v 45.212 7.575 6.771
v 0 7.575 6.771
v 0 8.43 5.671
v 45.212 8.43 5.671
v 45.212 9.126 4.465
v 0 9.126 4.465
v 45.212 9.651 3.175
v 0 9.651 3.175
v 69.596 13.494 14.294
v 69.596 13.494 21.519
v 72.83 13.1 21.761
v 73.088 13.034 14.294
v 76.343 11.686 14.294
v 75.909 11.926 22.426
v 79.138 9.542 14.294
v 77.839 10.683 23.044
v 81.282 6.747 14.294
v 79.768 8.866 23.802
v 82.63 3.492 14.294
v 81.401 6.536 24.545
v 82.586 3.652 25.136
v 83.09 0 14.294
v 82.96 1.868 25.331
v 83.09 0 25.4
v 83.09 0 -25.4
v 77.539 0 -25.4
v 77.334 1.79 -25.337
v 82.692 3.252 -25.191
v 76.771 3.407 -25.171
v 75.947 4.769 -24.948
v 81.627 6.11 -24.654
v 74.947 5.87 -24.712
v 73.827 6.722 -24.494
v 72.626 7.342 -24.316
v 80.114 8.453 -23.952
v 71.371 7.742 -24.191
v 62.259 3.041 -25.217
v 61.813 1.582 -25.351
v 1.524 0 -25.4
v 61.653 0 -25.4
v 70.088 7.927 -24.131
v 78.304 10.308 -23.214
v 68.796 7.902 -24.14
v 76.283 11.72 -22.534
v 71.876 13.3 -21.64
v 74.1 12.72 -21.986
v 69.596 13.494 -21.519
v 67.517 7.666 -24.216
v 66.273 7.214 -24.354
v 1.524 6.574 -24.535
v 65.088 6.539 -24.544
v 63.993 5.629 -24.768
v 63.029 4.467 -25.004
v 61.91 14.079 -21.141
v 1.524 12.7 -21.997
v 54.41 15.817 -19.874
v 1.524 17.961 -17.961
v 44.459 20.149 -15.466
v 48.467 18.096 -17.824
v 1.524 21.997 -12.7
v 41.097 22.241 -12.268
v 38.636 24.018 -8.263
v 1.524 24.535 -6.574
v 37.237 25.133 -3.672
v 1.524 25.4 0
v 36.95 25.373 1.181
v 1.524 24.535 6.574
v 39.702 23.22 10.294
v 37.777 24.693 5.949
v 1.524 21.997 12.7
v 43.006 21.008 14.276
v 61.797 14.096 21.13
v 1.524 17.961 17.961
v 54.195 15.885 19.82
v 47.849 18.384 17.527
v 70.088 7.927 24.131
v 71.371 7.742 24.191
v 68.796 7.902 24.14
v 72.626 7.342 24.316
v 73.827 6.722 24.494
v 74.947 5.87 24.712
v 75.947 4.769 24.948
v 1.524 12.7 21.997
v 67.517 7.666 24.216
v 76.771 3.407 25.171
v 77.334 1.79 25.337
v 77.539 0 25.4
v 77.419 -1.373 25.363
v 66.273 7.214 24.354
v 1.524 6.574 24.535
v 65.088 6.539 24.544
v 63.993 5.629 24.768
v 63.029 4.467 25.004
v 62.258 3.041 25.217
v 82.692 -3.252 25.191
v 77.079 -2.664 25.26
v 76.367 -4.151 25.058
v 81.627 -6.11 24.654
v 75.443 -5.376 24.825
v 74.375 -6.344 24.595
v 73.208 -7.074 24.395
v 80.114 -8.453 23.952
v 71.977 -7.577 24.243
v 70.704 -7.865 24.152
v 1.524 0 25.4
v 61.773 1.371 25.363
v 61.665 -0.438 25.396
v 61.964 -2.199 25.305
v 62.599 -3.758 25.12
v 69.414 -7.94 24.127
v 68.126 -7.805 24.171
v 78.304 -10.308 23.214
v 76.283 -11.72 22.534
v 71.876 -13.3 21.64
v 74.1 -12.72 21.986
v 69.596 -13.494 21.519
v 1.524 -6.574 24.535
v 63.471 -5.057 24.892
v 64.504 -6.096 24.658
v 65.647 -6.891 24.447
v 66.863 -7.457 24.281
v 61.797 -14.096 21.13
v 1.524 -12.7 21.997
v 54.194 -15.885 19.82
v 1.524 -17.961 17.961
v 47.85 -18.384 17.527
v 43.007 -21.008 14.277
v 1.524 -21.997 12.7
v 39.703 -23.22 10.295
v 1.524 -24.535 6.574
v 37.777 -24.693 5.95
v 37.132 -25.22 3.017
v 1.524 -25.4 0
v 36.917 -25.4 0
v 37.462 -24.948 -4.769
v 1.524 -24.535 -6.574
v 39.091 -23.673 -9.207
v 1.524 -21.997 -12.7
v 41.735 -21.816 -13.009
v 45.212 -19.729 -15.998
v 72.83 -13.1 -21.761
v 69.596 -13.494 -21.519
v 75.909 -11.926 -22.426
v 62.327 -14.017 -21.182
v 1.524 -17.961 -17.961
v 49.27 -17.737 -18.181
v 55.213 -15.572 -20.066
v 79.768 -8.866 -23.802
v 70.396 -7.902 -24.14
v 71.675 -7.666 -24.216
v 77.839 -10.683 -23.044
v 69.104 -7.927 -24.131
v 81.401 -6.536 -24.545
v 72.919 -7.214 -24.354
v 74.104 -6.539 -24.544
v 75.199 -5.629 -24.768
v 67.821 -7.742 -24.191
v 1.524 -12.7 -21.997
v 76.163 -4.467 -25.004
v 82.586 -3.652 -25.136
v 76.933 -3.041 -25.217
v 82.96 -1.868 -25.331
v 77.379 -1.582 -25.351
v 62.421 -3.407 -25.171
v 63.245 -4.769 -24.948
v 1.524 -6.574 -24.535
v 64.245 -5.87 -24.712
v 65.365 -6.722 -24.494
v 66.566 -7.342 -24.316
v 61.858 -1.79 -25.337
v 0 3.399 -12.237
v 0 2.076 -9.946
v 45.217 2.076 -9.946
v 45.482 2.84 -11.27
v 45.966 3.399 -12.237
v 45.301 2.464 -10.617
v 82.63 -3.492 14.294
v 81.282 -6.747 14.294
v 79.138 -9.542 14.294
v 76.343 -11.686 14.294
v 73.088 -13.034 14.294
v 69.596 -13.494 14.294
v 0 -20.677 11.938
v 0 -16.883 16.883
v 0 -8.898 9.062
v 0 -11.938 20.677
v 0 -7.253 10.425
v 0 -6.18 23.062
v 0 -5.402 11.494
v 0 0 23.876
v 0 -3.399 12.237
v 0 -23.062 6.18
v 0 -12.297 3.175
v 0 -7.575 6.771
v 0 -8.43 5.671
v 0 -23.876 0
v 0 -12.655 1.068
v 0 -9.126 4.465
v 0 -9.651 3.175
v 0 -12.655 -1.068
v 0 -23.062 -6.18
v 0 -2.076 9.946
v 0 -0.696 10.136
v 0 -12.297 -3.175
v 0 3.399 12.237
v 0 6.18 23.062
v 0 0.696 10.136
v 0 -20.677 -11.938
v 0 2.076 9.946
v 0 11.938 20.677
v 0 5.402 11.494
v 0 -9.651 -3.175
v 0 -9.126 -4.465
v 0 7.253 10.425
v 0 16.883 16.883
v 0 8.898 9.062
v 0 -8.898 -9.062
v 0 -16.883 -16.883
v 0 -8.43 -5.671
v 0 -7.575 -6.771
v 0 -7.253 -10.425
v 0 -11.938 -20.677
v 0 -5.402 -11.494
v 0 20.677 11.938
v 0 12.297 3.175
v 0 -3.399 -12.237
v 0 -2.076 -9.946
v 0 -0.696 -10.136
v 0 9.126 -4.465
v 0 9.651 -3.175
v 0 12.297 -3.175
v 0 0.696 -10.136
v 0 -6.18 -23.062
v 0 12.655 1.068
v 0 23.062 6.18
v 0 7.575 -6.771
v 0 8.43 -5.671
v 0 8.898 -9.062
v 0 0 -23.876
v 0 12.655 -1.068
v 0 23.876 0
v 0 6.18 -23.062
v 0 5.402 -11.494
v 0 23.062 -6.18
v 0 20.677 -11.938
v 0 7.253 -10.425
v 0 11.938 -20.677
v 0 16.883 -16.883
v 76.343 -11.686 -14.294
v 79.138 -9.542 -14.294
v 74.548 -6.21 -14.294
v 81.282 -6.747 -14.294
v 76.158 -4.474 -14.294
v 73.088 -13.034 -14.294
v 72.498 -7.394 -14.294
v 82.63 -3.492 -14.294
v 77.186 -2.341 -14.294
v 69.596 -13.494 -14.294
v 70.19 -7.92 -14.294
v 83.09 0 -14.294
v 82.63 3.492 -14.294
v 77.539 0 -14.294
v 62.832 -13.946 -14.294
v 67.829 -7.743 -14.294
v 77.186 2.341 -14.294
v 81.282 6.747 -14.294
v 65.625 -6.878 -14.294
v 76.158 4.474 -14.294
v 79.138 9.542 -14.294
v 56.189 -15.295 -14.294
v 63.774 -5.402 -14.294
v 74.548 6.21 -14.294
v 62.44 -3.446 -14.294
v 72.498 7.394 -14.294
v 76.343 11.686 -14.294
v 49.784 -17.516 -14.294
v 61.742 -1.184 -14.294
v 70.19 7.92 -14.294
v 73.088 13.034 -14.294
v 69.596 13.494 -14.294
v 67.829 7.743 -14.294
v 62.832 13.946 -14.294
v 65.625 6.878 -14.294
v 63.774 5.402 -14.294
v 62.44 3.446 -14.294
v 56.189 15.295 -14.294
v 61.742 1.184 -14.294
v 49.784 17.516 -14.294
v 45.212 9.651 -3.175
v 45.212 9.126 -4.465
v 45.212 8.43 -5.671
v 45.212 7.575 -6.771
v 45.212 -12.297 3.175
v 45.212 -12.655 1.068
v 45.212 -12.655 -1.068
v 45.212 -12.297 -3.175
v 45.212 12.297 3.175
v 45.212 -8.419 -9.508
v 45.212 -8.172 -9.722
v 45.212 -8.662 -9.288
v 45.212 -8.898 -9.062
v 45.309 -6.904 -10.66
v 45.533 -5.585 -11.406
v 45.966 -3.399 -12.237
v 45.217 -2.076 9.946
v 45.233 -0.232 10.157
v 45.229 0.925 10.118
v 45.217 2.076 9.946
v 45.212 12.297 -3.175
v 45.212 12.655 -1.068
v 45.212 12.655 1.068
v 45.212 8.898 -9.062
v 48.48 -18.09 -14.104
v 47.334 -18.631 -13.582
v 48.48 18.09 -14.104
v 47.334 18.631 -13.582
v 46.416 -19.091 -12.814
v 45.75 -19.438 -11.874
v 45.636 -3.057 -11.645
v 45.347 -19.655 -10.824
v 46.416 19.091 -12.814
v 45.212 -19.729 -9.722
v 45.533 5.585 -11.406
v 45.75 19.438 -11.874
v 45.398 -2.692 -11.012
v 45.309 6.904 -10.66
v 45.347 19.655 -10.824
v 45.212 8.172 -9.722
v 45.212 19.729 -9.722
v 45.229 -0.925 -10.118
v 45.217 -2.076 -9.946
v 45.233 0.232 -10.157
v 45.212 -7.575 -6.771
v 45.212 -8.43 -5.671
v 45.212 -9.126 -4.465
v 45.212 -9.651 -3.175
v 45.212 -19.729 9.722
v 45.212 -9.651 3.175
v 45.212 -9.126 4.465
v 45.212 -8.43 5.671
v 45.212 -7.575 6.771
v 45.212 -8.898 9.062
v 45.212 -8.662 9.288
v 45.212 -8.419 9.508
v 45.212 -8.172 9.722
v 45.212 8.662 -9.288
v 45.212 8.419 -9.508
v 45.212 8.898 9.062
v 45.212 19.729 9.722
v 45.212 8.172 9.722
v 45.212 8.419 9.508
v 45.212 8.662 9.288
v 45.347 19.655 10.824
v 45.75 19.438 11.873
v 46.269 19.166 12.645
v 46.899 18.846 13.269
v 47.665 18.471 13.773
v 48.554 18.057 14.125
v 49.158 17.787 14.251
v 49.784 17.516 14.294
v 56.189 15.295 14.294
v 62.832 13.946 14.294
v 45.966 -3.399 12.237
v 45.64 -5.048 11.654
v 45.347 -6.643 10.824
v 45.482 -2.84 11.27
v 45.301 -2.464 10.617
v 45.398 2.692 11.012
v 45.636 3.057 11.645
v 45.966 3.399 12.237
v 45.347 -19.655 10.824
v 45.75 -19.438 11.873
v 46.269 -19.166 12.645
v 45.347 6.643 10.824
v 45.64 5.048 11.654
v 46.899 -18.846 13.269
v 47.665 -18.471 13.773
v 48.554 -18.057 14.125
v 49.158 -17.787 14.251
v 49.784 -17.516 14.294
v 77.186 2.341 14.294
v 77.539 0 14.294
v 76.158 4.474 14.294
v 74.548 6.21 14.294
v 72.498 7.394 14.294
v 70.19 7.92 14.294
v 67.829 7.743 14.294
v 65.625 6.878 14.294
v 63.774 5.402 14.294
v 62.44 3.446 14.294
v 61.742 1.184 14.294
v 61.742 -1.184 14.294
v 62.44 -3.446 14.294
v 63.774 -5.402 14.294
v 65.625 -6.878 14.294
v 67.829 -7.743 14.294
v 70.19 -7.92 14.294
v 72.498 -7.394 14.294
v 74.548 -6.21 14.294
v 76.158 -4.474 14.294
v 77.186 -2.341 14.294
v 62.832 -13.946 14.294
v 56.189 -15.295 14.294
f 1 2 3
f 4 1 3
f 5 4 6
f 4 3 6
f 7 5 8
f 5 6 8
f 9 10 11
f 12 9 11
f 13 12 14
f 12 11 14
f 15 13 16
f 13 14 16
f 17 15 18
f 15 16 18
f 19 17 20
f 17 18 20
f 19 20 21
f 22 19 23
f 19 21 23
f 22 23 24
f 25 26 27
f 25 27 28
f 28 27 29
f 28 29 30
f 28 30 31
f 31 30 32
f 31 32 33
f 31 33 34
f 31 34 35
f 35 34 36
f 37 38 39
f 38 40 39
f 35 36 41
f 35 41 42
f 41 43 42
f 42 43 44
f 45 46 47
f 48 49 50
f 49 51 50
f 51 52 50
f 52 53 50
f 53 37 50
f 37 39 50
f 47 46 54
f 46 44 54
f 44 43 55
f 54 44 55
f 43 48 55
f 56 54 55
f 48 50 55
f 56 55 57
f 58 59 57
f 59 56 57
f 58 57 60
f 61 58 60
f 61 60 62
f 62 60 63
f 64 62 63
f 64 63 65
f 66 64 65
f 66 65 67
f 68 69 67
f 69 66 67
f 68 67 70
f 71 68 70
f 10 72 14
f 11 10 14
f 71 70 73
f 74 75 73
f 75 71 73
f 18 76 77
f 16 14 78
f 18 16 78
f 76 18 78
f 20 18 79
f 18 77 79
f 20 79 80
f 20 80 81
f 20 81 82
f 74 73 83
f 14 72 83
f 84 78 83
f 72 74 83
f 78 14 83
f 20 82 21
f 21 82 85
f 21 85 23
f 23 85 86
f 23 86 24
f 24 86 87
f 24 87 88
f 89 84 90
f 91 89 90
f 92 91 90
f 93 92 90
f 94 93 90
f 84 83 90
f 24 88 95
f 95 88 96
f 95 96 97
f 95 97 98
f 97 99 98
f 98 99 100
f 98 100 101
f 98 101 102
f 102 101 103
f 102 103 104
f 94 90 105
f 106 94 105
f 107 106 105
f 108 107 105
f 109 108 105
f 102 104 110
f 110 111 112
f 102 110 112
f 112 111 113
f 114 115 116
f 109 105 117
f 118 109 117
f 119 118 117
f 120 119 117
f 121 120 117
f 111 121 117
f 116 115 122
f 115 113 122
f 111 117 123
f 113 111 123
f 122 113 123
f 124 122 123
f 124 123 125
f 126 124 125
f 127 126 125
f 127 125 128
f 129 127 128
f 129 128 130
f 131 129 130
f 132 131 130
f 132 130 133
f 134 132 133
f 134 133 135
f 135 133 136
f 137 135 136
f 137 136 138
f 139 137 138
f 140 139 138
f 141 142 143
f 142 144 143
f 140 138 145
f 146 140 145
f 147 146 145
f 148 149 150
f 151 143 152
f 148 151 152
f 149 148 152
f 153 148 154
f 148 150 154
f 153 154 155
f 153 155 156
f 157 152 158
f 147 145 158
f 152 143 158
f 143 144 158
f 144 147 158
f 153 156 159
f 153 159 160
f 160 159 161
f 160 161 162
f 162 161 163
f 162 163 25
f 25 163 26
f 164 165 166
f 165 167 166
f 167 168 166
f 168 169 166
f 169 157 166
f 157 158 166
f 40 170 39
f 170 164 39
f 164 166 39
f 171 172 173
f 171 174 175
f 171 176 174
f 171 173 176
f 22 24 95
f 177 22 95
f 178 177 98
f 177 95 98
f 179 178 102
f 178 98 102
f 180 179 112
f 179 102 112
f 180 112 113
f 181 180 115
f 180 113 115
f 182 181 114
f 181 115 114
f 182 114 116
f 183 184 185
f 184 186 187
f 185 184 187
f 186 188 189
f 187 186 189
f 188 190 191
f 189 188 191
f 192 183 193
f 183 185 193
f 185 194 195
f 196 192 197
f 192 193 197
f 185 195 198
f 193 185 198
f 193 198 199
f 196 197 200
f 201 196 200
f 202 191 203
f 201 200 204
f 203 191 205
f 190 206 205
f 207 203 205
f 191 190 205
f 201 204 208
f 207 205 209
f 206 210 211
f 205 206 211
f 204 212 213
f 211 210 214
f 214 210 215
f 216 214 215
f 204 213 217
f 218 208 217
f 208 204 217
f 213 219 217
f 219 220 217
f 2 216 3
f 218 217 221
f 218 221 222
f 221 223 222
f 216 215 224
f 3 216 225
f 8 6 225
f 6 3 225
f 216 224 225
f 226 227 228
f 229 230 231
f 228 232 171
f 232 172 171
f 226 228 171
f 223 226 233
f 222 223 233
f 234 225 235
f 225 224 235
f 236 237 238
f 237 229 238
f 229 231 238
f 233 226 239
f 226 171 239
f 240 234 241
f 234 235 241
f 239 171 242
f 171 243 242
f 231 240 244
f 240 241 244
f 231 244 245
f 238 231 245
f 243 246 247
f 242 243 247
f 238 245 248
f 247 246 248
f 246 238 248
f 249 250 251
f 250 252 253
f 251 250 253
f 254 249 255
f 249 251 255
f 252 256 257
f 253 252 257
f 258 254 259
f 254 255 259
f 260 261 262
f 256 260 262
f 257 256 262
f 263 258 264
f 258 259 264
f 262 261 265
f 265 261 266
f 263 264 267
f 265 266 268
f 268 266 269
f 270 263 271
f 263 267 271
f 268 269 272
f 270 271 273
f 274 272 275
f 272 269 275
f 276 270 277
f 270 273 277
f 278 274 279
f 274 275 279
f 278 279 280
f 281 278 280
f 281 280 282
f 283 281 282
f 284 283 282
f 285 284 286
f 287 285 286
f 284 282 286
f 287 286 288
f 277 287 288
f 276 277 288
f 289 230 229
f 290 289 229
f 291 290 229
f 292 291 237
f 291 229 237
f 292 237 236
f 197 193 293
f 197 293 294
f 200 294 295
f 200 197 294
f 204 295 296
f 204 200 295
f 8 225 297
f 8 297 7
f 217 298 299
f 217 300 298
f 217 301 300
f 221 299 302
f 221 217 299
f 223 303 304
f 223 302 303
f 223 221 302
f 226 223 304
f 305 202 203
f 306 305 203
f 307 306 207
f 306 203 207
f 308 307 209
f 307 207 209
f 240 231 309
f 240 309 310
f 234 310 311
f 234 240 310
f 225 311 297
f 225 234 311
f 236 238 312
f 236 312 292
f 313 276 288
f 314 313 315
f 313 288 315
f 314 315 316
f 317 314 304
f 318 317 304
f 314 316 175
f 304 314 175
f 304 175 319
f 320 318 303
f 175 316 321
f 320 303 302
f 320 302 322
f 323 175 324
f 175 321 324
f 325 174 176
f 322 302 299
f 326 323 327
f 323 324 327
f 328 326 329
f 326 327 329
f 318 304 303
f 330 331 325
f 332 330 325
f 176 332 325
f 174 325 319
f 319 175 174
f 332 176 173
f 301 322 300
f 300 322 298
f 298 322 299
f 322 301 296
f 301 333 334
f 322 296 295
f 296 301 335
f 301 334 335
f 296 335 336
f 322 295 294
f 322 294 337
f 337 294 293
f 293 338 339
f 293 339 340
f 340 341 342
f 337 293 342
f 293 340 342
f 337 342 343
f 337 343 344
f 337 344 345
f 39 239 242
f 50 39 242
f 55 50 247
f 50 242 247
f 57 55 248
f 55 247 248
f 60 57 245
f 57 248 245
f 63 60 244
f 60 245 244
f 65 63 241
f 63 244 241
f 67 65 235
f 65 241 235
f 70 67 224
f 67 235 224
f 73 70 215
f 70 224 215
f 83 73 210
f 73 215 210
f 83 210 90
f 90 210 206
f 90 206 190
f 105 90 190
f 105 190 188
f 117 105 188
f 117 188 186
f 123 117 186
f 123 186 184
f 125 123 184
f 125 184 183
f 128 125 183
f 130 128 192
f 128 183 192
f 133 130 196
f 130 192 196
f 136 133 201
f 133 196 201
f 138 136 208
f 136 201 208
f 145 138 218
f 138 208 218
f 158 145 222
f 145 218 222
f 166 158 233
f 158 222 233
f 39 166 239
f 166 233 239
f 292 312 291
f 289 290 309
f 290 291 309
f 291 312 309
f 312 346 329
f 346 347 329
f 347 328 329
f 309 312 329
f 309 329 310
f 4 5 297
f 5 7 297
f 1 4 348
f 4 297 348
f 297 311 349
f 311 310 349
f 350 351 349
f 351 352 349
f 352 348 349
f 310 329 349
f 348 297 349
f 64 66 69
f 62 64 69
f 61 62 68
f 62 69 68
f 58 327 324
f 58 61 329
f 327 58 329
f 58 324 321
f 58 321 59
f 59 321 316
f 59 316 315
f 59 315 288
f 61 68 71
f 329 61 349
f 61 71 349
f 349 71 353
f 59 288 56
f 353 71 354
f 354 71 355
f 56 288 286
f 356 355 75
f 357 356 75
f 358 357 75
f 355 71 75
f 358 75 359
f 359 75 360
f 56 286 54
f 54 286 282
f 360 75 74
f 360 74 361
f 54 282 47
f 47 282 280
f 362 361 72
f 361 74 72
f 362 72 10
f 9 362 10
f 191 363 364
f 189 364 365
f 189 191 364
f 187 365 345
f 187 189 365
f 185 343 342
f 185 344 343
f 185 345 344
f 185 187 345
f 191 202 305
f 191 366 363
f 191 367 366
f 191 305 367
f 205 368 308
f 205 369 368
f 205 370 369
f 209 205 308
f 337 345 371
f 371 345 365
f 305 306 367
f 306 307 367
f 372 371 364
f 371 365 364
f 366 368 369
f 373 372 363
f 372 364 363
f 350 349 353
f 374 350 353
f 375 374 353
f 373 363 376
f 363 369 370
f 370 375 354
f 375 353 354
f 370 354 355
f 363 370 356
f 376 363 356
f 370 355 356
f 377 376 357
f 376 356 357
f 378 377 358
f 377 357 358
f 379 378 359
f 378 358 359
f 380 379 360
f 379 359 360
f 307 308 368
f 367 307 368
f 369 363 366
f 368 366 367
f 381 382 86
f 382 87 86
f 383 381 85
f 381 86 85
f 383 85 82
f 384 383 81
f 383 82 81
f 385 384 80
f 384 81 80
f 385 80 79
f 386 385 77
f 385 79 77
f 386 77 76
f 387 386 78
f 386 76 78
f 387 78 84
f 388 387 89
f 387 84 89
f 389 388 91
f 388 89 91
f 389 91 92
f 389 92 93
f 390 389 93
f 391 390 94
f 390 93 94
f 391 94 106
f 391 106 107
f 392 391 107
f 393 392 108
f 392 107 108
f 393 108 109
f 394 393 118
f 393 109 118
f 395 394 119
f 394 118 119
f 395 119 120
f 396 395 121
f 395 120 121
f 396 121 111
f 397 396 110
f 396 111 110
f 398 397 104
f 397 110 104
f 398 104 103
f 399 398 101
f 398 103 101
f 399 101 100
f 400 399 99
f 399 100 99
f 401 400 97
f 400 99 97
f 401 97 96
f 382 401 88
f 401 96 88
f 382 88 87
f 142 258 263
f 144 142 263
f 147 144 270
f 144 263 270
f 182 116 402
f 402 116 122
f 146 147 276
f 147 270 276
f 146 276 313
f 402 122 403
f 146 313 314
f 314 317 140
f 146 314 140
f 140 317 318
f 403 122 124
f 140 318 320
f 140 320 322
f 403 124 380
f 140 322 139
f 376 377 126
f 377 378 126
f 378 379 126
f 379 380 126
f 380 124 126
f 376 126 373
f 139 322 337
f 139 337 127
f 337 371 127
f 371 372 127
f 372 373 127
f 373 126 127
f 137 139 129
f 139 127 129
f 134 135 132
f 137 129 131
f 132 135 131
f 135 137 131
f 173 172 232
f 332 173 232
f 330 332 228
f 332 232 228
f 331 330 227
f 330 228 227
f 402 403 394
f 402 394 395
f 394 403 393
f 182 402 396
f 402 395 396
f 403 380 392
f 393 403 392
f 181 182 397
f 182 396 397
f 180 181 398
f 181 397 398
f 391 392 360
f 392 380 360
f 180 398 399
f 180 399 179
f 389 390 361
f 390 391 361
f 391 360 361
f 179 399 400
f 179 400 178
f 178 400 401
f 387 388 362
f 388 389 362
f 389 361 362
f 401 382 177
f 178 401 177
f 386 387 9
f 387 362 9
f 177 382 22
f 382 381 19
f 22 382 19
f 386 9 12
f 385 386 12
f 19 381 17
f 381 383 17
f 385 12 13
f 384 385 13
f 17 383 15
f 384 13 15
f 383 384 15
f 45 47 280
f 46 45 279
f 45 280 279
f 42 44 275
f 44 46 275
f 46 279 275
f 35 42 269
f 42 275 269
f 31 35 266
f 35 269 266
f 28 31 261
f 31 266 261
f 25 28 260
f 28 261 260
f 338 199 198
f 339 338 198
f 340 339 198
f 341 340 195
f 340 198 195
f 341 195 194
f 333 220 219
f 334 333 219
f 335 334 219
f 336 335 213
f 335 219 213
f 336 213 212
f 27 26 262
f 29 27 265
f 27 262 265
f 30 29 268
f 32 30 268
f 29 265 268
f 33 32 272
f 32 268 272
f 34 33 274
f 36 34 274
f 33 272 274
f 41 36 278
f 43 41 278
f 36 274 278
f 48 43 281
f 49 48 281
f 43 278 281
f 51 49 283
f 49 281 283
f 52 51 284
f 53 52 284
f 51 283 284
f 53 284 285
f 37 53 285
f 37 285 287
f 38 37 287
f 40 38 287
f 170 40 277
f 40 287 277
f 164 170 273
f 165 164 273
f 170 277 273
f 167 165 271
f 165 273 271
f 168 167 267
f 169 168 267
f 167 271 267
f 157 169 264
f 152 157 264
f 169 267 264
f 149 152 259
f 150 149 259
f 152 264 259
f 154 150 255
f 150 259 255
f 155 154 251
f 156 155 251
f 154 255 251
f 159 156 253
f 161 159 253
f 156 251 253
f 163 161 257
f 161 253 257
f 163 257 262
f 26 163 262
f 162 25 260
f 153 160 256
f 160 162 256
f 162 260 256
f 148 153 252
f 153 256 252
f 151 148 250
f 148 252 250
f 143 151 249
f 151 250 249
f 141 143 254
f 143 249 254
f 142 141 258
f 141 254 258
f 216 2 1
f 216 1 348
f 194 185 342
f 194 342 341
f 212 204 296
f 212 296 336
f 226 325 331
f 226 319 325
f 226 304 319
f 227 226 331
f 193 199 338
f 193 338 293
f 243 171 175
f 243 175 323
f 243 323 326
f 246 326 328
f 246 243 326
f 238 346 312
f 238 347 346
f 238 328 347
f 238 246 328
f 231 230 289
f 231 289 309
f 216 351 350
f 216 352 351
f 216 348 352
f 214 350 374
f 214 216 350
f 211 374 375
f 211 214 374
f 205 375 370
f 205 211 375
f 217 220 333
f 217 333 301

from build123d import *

# Parameters (mm, degrees)
SKETCH1_R           = 25.4
BOSS_EXTRUDE1_DEPTH = 83.08975
CUT_EXTRUDE1_DEPTH  = 43.688
SKETCH5_R           = 7.94258
CUT_EXTRUDE2_DEPTH  = 43.688
SKETCH6_W           = 13.49375
SKETCH6_H           = 14.29385
CUT_EXTRUDE3_DEPTH  = 43.688
CHAMFER1_SIZE       = 1.524
SKETCH8_R           = 10.16
CUT_EXTRUDE4_DEPTH  = 91.521967399
CUT_EXTRUDE5_DEPTH  = 91.521967399
CIRPATTERN1_COUNT   = 6


with BuildPart() as part:
    # Sketch1 → Boss-Extrude1 (new body)
    with BuildSketch(Plane(origin=(0, 0, 0), x_dir=(0, 0, -1), z_dir=(1, 0, 0))):
        Circle(SKETCH1_R)
    extrude(amount=BOSS_EXTRUDE1_DEPTH)

    # Sketch4 → Cut-Extrude1 (cut, symmetric)
    with BuildSketch(Plane.XY):
        with BuildLine():
            ThreePointArc((69.596, 13.49375), (79.137522129, 9.541522129), (83.08975, 0))
            Line((83.08975, 0), (83.08975, 25.4))
            Line((83.08975, 25.4), (36.9170127, 25.4))
            ThreePointArc((36.9170127, 25.4), (52.205808799, 16.563033999), (69.596, 13.49375))
        make_face()
        with BuildLine():
            Line((36.9170127, -25.4), (83.08975, -25.4))
            Line((83.08975, -25.4), (83.08975, 0))
            ThreePointArc((83.08975, 0), (79.137522129, -9.541522129), (69.596, -13.49375))
            ThreePointArc((69.596, -13.49375), (52.205808799, -16.563033999), (36.9170127, -25.4))
        make_face()
    extrude(amount=CUT_EXTRUDE1_DEPTH, both=True, mode=Mode.SUBTRACT)

    # Sketch5 → Cut-Extrude2 (cut, symmetric)
    with BuildSketch(Plane.XY):
        with Locations((69.596, 0)):
            Circle(SKETCH5_R)
    extrude(amount=CUT_EXTRUDE2_DEPTH, both=True, mode=Mode.SUBTRACT)

    # Sketch6 → Cut-Extrude3 (cut, symmetric)
    with BuildSketch(Plane(origin=(0, 0, 0), x_dir=(1, 0, 0), z_dir=(0, 1, 0))):
        with BuildLine():
            Line((69.596, 0), (69.596, 14.29385))
            Line((69.596, 14.29385), (49.784, 14.29385))
            ThreePointArc((49.784, 14.29385), (46.551107796, 12.954742204), (45.212, 9.72185))
            Line((45.212, 9.72185), (45.212, 0))
            Line((45.212, 0), (69.596, 0))
        make_face()
        with BuildLine():
            Line((69.596, -14.29385), (69.596, 0))
            Line((69.596, 0), (45.212, 0))
            Line((45.212, 0), (45.212, -9.72185))
            ThreePointArc((45.212, -9.72185), (46.551107796, -12.954742204), (49.784, -14.29385))
            Line((49.784, -14.29385), (69.596, -14.29385))
        make_face()
        with Locations((76.342875, -7.146925)):
            Rectangle(SKETCH6_W, SKETCH6_H)
        with Locations((76.342875, 7.146925)):
            Rectangle(SKETCH6_W, SKETCH6_H)
    extrude(amount=CUT_EXTRUDE3_DEPTH, both=True, mode=Mode.SUBTRACT)

    # Chamfer1
    chamfer1_edges = [part.edges().sort_by_distance(p)[0] for p in [
        (0, 0, 25.4),
    ]]
    chamfer(chamfer1_edges, length=CHAMFER1_SIZE)

    # Sketch8 → Cut-Extrude4 (cut, through all)
    with BuildSketch(Plane.ZY):
        Circle(SKETCH8_R)
    extrude(amount=-CUT_EXTRUDE4_DEPTH, mode=Mode.SUBTRACT)

    # Sketch7 → Cut-Extrude5 (cut, through all)
    with BuildSketch(Plane.ZY):
        with BuildLine():
            Line((-3.175, 9.651164438), (-3.175, 12.296722124))
            ThreePointArc((-3.175, 12.296722124), (0, 12.7), (3.175, 12.296722124))
            Line((3.175, 12.296722124), (3.175, 9.651164438))
            ThreePointArc((3.175, 9.651164438), (0, 10.16), (-3.175, 9.651164438))
        make_face()
    cut_extrude5 = extrude(amount=-CUT_EXTRUDE5_DEPTH, mode=Mode.SUBTRACT)

    # CirPattern1: Cut-Extrude5 ×6 about axis
    cirpattern1_axis = Axis((0, 0, 0), (1, 0, 0))
    for i in range(1, CIRPATTERN1_COUNT):
        add(cut_extrude5.rotate(cirpattern1_axis, i * 360 / CIRPATTERN1_COUNT), mode=Mode.SUBTRACT)


solid = part.part
